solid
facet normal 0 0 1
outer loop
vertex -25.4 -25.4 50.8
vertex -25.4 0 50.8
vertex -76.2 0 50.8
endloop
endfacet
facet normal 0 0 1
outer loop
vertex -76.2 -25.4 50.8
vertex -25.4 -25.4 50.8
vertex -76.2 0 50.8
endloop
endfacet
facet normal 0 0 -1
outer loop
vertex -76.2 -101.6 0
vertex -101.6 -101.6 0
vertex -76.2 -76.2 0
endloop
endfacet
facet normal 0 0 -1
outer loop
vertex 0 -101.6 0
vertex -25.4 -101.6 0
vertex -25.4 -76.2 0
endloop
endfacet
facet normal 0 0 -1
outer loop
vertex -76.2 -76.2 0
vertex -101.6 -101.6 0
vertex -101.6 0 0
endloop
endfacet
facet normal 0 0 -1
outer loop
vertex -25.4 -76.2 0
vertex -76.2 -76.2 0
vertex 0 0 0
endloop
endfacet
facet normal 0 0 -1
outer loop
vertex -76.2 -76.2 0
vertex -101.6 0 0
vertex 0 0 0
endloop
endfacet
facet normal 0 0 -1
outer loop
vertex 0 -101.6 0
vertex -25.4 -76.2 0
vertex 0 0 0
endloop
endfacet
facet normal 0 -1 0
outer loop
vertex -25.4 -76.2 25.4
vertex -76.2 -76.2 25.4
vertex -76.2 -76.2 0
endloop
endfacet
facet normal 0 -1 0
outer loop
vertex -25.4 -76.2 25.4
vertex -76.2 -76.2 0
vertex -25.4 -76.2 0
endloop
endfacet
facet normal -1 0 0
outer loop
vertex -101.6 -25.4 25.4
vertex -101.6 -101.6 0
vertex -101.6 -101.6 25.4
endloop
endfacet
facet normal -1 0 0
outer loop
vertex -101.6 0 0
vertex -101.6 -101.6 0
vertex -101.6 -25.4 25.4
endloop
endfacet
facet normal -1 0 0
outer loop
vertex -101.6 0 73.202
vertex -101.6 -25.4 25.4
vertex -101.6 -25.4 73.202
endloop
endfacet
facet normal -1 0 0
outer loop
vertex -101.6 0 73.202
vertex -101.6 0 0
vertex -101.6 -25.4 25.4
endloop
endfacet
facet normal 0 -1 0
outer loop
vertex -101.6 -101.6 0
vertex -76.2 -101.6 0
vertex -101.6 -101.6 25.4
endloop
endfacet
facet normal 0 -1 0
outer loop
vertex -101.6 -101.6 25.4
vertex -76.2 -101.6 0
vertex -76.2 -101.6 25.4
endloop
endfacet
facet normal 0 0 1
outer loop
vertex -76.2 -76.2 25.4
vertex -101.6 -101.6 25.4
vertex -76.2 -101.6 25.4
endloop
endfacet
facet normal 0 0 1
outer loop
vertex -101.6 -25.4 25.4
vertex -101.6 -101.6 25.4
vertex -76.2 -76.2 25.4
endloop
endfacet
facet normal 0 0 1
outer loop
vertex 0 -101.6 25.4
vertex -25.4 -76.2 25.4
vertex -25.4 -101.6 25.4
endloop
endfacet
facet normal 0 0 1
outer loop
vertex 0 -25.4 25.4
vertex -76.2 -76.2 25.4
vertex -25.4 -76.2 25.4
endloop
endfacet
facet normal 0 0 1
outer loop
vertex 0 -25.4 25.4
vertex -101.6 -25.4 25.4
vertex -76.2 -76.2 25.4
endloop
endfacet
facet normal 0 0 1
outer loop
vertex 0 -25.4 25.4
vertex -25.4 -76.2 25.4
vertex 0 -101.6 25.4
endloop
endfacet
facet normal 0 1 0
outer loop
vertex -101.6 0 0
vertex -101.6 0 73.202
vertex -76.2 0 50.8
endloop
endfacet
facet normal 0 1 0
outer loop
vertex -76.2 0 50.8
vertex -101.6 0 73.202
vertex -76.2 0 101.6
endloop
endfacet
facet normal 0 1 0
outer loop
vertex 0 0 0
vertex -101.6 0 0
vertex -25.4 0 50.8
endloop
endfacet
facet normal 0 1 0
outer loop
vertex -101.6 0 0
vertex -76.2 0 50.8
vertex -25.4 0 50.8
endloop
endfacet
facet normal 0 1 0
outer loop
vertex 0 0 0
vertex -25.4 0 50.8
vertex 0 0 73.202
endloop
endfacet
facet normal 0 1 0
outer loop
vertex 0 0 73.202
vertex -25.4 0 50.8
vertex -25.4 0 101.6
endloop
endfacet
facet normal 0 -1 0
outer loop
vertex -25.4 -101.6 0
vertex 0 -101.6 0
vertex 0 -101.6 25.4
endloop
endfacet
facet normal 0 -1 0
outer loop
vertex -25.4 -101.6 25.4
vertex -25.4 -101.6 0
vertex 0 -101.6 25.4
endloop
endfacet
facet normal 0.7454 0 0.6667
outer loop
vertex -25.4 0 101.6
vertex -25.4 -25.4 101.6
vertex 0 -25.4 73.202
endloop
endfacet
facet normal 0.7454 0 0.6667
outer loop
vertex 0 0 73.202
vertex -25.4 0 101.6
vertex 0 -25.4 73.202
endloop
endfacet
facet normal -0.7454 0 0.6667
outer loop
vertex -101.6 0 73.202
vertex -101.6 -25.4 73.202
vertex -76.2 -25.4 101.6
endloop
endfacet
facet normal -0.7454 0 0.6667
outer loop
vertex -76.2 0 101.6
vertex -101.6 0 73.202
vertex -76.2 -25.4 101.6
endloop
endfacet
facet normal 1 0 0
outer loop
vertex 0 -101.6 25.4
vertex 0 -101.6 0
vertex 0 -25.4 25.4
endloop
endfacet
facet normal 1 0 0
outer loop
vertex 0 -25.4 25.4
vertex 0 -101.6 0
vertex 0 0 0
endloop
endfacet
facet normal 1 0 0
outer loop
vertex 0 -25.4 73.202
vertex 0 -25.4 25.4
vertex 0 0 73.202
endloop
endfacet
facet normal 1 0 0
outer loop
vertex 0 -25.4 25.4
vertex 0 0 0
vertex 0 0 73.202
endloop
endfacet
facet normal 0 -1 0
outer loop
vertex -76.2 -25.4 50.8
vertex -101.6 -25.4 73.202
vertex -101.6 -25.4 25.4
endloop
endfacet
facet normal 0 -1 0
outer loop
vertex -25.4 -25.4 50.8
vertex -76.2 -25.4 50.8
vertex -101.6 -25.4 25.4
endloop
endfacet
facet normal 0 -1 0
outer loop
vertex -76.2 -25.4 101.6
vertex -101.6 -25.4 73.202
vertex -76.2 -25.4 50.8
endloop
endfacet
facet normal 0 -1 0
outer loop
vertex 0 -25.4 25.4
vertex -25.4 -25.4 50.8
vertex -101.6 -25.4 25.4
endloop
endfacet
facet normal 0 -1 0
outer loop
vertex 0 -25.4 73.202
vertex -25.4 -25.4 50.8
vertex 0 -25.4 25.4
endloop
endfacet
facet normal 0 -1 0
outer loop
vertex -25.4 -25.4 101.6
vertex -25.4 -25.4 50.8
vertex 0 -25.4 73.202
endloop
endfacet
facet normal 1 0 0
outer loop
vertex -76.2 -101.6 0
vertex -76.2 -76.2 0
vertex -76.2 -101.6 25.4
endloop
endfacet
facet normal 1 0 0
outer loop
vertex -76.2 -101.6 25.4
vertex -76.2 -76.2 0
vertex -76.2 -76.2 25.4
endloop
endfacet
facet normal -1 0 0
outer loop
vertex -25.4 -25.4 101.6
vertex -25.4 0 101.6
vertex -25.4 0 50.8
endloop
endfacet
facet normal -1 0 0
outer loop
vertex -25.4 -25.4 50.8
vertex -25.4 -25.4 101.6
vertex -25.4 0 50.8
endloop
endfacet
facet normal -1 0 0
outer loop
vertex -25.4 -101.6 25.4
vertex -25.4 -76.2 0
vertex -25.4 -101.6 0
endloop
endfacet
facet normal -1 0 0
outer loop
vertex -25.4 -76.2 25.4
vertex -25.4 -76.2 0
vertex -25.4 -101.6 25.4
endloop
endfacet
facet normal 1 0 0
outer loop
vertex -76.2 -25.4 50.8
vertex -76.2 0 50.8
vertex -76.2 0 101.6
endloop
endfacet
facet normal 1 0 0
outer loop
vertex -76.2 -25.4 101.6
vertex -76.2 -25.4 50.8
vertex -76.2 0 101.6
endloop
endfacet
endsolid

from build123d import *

# Parameters (mm, degrees)
F1_DEPTH  = 25.4
F2_W      = 76.2
F2_H      = 25.4
F3_DEPTH  = 101.6
F4_W      = 50.8
F4_H      = 25.4
F5_DEPTH  = 25.4
F7_DEPTH  = 25.4
F9_DEPTH  = 25.4
F10_DEPTH = 25.4
F11_DEPTH = 25.4
F12_DEPTH = 25.4


with BuildPart() as f1:
    # F0 (on Front) → F1 (new body)
    with BuildSketch(Plane.XZ):
        Polygon((-101.6, 0), (0, 0), (0, 101.6), (-25.4, 101.6), (-25.4, 50.8), (-76.2, 50.8), (-76.2, 101.6), (-101.6, 101.6), align=None)
    extrude(amount=F1_DEPTH)

    # F2 (on Right) → F3 (join)
    with BuildSketch(Plane.YZ):
        with Locations((-38.1, 12.7)):
            Rectangle(F2_W, F2_H)
    extrude(amount=-F3_DEPTH)

    # F4 (on face) → F5 (cut)
    with BuildSketch(Plane.XZ.offset(76.2)):
        with Locations((-50.8, 12.7)):
            Rectangle(F4_W, F4_H)
    extrude(amount=-F5_DEPTH, mode=Mode.SUBTRACT)

    # F6 (on face) → F7 (cut)
    with BuildSketch(Plane.XZ.offset(25.4)):
        Polygon((0, 101.6), (-25.4, 101.6), (0, 73.2019366858), align=None)
    extrude(amount=-F7_DEPTH, mode=Mode.SUBTRACT)

    # F8 (on face) → F9 (cut)
    with BuildSketch(Plane.XZ.offset(25.4)):
        Polygon((-101.6, 73.2019366858), (-76.2, 101.6), (-101.6, 101.6), align=None)
    extrude(amount=-F9_DEPTH, mode=Mode.SUBTRACT)

    # F10 (add): a face of the model
    f10_faces = [f1.faces().sort_by_distance(p)[0] for p in [
        (-12.7, -76.2, 12.7),
    ]]
    extrude(f10_faces, amount=F10_DEPTH)

    # F11 (add): a face of the model
    f11_faces = [f1.faces().sort_by_distance(p)[0] for p in [
        (-88.9, -76.2, 12.7),
    ]]
    extrude(f11_faces, amount=F11_DEPTH)

    # F12 (add): a face of the model
    f12_faces = [f1.faces().sort_by_distance(p)[0] for p in [
        (-50.8, -50.8, 12.7),
    ]]
    extrude(f12_faces, amount=F12_DEPTH)


solid = f1.part
